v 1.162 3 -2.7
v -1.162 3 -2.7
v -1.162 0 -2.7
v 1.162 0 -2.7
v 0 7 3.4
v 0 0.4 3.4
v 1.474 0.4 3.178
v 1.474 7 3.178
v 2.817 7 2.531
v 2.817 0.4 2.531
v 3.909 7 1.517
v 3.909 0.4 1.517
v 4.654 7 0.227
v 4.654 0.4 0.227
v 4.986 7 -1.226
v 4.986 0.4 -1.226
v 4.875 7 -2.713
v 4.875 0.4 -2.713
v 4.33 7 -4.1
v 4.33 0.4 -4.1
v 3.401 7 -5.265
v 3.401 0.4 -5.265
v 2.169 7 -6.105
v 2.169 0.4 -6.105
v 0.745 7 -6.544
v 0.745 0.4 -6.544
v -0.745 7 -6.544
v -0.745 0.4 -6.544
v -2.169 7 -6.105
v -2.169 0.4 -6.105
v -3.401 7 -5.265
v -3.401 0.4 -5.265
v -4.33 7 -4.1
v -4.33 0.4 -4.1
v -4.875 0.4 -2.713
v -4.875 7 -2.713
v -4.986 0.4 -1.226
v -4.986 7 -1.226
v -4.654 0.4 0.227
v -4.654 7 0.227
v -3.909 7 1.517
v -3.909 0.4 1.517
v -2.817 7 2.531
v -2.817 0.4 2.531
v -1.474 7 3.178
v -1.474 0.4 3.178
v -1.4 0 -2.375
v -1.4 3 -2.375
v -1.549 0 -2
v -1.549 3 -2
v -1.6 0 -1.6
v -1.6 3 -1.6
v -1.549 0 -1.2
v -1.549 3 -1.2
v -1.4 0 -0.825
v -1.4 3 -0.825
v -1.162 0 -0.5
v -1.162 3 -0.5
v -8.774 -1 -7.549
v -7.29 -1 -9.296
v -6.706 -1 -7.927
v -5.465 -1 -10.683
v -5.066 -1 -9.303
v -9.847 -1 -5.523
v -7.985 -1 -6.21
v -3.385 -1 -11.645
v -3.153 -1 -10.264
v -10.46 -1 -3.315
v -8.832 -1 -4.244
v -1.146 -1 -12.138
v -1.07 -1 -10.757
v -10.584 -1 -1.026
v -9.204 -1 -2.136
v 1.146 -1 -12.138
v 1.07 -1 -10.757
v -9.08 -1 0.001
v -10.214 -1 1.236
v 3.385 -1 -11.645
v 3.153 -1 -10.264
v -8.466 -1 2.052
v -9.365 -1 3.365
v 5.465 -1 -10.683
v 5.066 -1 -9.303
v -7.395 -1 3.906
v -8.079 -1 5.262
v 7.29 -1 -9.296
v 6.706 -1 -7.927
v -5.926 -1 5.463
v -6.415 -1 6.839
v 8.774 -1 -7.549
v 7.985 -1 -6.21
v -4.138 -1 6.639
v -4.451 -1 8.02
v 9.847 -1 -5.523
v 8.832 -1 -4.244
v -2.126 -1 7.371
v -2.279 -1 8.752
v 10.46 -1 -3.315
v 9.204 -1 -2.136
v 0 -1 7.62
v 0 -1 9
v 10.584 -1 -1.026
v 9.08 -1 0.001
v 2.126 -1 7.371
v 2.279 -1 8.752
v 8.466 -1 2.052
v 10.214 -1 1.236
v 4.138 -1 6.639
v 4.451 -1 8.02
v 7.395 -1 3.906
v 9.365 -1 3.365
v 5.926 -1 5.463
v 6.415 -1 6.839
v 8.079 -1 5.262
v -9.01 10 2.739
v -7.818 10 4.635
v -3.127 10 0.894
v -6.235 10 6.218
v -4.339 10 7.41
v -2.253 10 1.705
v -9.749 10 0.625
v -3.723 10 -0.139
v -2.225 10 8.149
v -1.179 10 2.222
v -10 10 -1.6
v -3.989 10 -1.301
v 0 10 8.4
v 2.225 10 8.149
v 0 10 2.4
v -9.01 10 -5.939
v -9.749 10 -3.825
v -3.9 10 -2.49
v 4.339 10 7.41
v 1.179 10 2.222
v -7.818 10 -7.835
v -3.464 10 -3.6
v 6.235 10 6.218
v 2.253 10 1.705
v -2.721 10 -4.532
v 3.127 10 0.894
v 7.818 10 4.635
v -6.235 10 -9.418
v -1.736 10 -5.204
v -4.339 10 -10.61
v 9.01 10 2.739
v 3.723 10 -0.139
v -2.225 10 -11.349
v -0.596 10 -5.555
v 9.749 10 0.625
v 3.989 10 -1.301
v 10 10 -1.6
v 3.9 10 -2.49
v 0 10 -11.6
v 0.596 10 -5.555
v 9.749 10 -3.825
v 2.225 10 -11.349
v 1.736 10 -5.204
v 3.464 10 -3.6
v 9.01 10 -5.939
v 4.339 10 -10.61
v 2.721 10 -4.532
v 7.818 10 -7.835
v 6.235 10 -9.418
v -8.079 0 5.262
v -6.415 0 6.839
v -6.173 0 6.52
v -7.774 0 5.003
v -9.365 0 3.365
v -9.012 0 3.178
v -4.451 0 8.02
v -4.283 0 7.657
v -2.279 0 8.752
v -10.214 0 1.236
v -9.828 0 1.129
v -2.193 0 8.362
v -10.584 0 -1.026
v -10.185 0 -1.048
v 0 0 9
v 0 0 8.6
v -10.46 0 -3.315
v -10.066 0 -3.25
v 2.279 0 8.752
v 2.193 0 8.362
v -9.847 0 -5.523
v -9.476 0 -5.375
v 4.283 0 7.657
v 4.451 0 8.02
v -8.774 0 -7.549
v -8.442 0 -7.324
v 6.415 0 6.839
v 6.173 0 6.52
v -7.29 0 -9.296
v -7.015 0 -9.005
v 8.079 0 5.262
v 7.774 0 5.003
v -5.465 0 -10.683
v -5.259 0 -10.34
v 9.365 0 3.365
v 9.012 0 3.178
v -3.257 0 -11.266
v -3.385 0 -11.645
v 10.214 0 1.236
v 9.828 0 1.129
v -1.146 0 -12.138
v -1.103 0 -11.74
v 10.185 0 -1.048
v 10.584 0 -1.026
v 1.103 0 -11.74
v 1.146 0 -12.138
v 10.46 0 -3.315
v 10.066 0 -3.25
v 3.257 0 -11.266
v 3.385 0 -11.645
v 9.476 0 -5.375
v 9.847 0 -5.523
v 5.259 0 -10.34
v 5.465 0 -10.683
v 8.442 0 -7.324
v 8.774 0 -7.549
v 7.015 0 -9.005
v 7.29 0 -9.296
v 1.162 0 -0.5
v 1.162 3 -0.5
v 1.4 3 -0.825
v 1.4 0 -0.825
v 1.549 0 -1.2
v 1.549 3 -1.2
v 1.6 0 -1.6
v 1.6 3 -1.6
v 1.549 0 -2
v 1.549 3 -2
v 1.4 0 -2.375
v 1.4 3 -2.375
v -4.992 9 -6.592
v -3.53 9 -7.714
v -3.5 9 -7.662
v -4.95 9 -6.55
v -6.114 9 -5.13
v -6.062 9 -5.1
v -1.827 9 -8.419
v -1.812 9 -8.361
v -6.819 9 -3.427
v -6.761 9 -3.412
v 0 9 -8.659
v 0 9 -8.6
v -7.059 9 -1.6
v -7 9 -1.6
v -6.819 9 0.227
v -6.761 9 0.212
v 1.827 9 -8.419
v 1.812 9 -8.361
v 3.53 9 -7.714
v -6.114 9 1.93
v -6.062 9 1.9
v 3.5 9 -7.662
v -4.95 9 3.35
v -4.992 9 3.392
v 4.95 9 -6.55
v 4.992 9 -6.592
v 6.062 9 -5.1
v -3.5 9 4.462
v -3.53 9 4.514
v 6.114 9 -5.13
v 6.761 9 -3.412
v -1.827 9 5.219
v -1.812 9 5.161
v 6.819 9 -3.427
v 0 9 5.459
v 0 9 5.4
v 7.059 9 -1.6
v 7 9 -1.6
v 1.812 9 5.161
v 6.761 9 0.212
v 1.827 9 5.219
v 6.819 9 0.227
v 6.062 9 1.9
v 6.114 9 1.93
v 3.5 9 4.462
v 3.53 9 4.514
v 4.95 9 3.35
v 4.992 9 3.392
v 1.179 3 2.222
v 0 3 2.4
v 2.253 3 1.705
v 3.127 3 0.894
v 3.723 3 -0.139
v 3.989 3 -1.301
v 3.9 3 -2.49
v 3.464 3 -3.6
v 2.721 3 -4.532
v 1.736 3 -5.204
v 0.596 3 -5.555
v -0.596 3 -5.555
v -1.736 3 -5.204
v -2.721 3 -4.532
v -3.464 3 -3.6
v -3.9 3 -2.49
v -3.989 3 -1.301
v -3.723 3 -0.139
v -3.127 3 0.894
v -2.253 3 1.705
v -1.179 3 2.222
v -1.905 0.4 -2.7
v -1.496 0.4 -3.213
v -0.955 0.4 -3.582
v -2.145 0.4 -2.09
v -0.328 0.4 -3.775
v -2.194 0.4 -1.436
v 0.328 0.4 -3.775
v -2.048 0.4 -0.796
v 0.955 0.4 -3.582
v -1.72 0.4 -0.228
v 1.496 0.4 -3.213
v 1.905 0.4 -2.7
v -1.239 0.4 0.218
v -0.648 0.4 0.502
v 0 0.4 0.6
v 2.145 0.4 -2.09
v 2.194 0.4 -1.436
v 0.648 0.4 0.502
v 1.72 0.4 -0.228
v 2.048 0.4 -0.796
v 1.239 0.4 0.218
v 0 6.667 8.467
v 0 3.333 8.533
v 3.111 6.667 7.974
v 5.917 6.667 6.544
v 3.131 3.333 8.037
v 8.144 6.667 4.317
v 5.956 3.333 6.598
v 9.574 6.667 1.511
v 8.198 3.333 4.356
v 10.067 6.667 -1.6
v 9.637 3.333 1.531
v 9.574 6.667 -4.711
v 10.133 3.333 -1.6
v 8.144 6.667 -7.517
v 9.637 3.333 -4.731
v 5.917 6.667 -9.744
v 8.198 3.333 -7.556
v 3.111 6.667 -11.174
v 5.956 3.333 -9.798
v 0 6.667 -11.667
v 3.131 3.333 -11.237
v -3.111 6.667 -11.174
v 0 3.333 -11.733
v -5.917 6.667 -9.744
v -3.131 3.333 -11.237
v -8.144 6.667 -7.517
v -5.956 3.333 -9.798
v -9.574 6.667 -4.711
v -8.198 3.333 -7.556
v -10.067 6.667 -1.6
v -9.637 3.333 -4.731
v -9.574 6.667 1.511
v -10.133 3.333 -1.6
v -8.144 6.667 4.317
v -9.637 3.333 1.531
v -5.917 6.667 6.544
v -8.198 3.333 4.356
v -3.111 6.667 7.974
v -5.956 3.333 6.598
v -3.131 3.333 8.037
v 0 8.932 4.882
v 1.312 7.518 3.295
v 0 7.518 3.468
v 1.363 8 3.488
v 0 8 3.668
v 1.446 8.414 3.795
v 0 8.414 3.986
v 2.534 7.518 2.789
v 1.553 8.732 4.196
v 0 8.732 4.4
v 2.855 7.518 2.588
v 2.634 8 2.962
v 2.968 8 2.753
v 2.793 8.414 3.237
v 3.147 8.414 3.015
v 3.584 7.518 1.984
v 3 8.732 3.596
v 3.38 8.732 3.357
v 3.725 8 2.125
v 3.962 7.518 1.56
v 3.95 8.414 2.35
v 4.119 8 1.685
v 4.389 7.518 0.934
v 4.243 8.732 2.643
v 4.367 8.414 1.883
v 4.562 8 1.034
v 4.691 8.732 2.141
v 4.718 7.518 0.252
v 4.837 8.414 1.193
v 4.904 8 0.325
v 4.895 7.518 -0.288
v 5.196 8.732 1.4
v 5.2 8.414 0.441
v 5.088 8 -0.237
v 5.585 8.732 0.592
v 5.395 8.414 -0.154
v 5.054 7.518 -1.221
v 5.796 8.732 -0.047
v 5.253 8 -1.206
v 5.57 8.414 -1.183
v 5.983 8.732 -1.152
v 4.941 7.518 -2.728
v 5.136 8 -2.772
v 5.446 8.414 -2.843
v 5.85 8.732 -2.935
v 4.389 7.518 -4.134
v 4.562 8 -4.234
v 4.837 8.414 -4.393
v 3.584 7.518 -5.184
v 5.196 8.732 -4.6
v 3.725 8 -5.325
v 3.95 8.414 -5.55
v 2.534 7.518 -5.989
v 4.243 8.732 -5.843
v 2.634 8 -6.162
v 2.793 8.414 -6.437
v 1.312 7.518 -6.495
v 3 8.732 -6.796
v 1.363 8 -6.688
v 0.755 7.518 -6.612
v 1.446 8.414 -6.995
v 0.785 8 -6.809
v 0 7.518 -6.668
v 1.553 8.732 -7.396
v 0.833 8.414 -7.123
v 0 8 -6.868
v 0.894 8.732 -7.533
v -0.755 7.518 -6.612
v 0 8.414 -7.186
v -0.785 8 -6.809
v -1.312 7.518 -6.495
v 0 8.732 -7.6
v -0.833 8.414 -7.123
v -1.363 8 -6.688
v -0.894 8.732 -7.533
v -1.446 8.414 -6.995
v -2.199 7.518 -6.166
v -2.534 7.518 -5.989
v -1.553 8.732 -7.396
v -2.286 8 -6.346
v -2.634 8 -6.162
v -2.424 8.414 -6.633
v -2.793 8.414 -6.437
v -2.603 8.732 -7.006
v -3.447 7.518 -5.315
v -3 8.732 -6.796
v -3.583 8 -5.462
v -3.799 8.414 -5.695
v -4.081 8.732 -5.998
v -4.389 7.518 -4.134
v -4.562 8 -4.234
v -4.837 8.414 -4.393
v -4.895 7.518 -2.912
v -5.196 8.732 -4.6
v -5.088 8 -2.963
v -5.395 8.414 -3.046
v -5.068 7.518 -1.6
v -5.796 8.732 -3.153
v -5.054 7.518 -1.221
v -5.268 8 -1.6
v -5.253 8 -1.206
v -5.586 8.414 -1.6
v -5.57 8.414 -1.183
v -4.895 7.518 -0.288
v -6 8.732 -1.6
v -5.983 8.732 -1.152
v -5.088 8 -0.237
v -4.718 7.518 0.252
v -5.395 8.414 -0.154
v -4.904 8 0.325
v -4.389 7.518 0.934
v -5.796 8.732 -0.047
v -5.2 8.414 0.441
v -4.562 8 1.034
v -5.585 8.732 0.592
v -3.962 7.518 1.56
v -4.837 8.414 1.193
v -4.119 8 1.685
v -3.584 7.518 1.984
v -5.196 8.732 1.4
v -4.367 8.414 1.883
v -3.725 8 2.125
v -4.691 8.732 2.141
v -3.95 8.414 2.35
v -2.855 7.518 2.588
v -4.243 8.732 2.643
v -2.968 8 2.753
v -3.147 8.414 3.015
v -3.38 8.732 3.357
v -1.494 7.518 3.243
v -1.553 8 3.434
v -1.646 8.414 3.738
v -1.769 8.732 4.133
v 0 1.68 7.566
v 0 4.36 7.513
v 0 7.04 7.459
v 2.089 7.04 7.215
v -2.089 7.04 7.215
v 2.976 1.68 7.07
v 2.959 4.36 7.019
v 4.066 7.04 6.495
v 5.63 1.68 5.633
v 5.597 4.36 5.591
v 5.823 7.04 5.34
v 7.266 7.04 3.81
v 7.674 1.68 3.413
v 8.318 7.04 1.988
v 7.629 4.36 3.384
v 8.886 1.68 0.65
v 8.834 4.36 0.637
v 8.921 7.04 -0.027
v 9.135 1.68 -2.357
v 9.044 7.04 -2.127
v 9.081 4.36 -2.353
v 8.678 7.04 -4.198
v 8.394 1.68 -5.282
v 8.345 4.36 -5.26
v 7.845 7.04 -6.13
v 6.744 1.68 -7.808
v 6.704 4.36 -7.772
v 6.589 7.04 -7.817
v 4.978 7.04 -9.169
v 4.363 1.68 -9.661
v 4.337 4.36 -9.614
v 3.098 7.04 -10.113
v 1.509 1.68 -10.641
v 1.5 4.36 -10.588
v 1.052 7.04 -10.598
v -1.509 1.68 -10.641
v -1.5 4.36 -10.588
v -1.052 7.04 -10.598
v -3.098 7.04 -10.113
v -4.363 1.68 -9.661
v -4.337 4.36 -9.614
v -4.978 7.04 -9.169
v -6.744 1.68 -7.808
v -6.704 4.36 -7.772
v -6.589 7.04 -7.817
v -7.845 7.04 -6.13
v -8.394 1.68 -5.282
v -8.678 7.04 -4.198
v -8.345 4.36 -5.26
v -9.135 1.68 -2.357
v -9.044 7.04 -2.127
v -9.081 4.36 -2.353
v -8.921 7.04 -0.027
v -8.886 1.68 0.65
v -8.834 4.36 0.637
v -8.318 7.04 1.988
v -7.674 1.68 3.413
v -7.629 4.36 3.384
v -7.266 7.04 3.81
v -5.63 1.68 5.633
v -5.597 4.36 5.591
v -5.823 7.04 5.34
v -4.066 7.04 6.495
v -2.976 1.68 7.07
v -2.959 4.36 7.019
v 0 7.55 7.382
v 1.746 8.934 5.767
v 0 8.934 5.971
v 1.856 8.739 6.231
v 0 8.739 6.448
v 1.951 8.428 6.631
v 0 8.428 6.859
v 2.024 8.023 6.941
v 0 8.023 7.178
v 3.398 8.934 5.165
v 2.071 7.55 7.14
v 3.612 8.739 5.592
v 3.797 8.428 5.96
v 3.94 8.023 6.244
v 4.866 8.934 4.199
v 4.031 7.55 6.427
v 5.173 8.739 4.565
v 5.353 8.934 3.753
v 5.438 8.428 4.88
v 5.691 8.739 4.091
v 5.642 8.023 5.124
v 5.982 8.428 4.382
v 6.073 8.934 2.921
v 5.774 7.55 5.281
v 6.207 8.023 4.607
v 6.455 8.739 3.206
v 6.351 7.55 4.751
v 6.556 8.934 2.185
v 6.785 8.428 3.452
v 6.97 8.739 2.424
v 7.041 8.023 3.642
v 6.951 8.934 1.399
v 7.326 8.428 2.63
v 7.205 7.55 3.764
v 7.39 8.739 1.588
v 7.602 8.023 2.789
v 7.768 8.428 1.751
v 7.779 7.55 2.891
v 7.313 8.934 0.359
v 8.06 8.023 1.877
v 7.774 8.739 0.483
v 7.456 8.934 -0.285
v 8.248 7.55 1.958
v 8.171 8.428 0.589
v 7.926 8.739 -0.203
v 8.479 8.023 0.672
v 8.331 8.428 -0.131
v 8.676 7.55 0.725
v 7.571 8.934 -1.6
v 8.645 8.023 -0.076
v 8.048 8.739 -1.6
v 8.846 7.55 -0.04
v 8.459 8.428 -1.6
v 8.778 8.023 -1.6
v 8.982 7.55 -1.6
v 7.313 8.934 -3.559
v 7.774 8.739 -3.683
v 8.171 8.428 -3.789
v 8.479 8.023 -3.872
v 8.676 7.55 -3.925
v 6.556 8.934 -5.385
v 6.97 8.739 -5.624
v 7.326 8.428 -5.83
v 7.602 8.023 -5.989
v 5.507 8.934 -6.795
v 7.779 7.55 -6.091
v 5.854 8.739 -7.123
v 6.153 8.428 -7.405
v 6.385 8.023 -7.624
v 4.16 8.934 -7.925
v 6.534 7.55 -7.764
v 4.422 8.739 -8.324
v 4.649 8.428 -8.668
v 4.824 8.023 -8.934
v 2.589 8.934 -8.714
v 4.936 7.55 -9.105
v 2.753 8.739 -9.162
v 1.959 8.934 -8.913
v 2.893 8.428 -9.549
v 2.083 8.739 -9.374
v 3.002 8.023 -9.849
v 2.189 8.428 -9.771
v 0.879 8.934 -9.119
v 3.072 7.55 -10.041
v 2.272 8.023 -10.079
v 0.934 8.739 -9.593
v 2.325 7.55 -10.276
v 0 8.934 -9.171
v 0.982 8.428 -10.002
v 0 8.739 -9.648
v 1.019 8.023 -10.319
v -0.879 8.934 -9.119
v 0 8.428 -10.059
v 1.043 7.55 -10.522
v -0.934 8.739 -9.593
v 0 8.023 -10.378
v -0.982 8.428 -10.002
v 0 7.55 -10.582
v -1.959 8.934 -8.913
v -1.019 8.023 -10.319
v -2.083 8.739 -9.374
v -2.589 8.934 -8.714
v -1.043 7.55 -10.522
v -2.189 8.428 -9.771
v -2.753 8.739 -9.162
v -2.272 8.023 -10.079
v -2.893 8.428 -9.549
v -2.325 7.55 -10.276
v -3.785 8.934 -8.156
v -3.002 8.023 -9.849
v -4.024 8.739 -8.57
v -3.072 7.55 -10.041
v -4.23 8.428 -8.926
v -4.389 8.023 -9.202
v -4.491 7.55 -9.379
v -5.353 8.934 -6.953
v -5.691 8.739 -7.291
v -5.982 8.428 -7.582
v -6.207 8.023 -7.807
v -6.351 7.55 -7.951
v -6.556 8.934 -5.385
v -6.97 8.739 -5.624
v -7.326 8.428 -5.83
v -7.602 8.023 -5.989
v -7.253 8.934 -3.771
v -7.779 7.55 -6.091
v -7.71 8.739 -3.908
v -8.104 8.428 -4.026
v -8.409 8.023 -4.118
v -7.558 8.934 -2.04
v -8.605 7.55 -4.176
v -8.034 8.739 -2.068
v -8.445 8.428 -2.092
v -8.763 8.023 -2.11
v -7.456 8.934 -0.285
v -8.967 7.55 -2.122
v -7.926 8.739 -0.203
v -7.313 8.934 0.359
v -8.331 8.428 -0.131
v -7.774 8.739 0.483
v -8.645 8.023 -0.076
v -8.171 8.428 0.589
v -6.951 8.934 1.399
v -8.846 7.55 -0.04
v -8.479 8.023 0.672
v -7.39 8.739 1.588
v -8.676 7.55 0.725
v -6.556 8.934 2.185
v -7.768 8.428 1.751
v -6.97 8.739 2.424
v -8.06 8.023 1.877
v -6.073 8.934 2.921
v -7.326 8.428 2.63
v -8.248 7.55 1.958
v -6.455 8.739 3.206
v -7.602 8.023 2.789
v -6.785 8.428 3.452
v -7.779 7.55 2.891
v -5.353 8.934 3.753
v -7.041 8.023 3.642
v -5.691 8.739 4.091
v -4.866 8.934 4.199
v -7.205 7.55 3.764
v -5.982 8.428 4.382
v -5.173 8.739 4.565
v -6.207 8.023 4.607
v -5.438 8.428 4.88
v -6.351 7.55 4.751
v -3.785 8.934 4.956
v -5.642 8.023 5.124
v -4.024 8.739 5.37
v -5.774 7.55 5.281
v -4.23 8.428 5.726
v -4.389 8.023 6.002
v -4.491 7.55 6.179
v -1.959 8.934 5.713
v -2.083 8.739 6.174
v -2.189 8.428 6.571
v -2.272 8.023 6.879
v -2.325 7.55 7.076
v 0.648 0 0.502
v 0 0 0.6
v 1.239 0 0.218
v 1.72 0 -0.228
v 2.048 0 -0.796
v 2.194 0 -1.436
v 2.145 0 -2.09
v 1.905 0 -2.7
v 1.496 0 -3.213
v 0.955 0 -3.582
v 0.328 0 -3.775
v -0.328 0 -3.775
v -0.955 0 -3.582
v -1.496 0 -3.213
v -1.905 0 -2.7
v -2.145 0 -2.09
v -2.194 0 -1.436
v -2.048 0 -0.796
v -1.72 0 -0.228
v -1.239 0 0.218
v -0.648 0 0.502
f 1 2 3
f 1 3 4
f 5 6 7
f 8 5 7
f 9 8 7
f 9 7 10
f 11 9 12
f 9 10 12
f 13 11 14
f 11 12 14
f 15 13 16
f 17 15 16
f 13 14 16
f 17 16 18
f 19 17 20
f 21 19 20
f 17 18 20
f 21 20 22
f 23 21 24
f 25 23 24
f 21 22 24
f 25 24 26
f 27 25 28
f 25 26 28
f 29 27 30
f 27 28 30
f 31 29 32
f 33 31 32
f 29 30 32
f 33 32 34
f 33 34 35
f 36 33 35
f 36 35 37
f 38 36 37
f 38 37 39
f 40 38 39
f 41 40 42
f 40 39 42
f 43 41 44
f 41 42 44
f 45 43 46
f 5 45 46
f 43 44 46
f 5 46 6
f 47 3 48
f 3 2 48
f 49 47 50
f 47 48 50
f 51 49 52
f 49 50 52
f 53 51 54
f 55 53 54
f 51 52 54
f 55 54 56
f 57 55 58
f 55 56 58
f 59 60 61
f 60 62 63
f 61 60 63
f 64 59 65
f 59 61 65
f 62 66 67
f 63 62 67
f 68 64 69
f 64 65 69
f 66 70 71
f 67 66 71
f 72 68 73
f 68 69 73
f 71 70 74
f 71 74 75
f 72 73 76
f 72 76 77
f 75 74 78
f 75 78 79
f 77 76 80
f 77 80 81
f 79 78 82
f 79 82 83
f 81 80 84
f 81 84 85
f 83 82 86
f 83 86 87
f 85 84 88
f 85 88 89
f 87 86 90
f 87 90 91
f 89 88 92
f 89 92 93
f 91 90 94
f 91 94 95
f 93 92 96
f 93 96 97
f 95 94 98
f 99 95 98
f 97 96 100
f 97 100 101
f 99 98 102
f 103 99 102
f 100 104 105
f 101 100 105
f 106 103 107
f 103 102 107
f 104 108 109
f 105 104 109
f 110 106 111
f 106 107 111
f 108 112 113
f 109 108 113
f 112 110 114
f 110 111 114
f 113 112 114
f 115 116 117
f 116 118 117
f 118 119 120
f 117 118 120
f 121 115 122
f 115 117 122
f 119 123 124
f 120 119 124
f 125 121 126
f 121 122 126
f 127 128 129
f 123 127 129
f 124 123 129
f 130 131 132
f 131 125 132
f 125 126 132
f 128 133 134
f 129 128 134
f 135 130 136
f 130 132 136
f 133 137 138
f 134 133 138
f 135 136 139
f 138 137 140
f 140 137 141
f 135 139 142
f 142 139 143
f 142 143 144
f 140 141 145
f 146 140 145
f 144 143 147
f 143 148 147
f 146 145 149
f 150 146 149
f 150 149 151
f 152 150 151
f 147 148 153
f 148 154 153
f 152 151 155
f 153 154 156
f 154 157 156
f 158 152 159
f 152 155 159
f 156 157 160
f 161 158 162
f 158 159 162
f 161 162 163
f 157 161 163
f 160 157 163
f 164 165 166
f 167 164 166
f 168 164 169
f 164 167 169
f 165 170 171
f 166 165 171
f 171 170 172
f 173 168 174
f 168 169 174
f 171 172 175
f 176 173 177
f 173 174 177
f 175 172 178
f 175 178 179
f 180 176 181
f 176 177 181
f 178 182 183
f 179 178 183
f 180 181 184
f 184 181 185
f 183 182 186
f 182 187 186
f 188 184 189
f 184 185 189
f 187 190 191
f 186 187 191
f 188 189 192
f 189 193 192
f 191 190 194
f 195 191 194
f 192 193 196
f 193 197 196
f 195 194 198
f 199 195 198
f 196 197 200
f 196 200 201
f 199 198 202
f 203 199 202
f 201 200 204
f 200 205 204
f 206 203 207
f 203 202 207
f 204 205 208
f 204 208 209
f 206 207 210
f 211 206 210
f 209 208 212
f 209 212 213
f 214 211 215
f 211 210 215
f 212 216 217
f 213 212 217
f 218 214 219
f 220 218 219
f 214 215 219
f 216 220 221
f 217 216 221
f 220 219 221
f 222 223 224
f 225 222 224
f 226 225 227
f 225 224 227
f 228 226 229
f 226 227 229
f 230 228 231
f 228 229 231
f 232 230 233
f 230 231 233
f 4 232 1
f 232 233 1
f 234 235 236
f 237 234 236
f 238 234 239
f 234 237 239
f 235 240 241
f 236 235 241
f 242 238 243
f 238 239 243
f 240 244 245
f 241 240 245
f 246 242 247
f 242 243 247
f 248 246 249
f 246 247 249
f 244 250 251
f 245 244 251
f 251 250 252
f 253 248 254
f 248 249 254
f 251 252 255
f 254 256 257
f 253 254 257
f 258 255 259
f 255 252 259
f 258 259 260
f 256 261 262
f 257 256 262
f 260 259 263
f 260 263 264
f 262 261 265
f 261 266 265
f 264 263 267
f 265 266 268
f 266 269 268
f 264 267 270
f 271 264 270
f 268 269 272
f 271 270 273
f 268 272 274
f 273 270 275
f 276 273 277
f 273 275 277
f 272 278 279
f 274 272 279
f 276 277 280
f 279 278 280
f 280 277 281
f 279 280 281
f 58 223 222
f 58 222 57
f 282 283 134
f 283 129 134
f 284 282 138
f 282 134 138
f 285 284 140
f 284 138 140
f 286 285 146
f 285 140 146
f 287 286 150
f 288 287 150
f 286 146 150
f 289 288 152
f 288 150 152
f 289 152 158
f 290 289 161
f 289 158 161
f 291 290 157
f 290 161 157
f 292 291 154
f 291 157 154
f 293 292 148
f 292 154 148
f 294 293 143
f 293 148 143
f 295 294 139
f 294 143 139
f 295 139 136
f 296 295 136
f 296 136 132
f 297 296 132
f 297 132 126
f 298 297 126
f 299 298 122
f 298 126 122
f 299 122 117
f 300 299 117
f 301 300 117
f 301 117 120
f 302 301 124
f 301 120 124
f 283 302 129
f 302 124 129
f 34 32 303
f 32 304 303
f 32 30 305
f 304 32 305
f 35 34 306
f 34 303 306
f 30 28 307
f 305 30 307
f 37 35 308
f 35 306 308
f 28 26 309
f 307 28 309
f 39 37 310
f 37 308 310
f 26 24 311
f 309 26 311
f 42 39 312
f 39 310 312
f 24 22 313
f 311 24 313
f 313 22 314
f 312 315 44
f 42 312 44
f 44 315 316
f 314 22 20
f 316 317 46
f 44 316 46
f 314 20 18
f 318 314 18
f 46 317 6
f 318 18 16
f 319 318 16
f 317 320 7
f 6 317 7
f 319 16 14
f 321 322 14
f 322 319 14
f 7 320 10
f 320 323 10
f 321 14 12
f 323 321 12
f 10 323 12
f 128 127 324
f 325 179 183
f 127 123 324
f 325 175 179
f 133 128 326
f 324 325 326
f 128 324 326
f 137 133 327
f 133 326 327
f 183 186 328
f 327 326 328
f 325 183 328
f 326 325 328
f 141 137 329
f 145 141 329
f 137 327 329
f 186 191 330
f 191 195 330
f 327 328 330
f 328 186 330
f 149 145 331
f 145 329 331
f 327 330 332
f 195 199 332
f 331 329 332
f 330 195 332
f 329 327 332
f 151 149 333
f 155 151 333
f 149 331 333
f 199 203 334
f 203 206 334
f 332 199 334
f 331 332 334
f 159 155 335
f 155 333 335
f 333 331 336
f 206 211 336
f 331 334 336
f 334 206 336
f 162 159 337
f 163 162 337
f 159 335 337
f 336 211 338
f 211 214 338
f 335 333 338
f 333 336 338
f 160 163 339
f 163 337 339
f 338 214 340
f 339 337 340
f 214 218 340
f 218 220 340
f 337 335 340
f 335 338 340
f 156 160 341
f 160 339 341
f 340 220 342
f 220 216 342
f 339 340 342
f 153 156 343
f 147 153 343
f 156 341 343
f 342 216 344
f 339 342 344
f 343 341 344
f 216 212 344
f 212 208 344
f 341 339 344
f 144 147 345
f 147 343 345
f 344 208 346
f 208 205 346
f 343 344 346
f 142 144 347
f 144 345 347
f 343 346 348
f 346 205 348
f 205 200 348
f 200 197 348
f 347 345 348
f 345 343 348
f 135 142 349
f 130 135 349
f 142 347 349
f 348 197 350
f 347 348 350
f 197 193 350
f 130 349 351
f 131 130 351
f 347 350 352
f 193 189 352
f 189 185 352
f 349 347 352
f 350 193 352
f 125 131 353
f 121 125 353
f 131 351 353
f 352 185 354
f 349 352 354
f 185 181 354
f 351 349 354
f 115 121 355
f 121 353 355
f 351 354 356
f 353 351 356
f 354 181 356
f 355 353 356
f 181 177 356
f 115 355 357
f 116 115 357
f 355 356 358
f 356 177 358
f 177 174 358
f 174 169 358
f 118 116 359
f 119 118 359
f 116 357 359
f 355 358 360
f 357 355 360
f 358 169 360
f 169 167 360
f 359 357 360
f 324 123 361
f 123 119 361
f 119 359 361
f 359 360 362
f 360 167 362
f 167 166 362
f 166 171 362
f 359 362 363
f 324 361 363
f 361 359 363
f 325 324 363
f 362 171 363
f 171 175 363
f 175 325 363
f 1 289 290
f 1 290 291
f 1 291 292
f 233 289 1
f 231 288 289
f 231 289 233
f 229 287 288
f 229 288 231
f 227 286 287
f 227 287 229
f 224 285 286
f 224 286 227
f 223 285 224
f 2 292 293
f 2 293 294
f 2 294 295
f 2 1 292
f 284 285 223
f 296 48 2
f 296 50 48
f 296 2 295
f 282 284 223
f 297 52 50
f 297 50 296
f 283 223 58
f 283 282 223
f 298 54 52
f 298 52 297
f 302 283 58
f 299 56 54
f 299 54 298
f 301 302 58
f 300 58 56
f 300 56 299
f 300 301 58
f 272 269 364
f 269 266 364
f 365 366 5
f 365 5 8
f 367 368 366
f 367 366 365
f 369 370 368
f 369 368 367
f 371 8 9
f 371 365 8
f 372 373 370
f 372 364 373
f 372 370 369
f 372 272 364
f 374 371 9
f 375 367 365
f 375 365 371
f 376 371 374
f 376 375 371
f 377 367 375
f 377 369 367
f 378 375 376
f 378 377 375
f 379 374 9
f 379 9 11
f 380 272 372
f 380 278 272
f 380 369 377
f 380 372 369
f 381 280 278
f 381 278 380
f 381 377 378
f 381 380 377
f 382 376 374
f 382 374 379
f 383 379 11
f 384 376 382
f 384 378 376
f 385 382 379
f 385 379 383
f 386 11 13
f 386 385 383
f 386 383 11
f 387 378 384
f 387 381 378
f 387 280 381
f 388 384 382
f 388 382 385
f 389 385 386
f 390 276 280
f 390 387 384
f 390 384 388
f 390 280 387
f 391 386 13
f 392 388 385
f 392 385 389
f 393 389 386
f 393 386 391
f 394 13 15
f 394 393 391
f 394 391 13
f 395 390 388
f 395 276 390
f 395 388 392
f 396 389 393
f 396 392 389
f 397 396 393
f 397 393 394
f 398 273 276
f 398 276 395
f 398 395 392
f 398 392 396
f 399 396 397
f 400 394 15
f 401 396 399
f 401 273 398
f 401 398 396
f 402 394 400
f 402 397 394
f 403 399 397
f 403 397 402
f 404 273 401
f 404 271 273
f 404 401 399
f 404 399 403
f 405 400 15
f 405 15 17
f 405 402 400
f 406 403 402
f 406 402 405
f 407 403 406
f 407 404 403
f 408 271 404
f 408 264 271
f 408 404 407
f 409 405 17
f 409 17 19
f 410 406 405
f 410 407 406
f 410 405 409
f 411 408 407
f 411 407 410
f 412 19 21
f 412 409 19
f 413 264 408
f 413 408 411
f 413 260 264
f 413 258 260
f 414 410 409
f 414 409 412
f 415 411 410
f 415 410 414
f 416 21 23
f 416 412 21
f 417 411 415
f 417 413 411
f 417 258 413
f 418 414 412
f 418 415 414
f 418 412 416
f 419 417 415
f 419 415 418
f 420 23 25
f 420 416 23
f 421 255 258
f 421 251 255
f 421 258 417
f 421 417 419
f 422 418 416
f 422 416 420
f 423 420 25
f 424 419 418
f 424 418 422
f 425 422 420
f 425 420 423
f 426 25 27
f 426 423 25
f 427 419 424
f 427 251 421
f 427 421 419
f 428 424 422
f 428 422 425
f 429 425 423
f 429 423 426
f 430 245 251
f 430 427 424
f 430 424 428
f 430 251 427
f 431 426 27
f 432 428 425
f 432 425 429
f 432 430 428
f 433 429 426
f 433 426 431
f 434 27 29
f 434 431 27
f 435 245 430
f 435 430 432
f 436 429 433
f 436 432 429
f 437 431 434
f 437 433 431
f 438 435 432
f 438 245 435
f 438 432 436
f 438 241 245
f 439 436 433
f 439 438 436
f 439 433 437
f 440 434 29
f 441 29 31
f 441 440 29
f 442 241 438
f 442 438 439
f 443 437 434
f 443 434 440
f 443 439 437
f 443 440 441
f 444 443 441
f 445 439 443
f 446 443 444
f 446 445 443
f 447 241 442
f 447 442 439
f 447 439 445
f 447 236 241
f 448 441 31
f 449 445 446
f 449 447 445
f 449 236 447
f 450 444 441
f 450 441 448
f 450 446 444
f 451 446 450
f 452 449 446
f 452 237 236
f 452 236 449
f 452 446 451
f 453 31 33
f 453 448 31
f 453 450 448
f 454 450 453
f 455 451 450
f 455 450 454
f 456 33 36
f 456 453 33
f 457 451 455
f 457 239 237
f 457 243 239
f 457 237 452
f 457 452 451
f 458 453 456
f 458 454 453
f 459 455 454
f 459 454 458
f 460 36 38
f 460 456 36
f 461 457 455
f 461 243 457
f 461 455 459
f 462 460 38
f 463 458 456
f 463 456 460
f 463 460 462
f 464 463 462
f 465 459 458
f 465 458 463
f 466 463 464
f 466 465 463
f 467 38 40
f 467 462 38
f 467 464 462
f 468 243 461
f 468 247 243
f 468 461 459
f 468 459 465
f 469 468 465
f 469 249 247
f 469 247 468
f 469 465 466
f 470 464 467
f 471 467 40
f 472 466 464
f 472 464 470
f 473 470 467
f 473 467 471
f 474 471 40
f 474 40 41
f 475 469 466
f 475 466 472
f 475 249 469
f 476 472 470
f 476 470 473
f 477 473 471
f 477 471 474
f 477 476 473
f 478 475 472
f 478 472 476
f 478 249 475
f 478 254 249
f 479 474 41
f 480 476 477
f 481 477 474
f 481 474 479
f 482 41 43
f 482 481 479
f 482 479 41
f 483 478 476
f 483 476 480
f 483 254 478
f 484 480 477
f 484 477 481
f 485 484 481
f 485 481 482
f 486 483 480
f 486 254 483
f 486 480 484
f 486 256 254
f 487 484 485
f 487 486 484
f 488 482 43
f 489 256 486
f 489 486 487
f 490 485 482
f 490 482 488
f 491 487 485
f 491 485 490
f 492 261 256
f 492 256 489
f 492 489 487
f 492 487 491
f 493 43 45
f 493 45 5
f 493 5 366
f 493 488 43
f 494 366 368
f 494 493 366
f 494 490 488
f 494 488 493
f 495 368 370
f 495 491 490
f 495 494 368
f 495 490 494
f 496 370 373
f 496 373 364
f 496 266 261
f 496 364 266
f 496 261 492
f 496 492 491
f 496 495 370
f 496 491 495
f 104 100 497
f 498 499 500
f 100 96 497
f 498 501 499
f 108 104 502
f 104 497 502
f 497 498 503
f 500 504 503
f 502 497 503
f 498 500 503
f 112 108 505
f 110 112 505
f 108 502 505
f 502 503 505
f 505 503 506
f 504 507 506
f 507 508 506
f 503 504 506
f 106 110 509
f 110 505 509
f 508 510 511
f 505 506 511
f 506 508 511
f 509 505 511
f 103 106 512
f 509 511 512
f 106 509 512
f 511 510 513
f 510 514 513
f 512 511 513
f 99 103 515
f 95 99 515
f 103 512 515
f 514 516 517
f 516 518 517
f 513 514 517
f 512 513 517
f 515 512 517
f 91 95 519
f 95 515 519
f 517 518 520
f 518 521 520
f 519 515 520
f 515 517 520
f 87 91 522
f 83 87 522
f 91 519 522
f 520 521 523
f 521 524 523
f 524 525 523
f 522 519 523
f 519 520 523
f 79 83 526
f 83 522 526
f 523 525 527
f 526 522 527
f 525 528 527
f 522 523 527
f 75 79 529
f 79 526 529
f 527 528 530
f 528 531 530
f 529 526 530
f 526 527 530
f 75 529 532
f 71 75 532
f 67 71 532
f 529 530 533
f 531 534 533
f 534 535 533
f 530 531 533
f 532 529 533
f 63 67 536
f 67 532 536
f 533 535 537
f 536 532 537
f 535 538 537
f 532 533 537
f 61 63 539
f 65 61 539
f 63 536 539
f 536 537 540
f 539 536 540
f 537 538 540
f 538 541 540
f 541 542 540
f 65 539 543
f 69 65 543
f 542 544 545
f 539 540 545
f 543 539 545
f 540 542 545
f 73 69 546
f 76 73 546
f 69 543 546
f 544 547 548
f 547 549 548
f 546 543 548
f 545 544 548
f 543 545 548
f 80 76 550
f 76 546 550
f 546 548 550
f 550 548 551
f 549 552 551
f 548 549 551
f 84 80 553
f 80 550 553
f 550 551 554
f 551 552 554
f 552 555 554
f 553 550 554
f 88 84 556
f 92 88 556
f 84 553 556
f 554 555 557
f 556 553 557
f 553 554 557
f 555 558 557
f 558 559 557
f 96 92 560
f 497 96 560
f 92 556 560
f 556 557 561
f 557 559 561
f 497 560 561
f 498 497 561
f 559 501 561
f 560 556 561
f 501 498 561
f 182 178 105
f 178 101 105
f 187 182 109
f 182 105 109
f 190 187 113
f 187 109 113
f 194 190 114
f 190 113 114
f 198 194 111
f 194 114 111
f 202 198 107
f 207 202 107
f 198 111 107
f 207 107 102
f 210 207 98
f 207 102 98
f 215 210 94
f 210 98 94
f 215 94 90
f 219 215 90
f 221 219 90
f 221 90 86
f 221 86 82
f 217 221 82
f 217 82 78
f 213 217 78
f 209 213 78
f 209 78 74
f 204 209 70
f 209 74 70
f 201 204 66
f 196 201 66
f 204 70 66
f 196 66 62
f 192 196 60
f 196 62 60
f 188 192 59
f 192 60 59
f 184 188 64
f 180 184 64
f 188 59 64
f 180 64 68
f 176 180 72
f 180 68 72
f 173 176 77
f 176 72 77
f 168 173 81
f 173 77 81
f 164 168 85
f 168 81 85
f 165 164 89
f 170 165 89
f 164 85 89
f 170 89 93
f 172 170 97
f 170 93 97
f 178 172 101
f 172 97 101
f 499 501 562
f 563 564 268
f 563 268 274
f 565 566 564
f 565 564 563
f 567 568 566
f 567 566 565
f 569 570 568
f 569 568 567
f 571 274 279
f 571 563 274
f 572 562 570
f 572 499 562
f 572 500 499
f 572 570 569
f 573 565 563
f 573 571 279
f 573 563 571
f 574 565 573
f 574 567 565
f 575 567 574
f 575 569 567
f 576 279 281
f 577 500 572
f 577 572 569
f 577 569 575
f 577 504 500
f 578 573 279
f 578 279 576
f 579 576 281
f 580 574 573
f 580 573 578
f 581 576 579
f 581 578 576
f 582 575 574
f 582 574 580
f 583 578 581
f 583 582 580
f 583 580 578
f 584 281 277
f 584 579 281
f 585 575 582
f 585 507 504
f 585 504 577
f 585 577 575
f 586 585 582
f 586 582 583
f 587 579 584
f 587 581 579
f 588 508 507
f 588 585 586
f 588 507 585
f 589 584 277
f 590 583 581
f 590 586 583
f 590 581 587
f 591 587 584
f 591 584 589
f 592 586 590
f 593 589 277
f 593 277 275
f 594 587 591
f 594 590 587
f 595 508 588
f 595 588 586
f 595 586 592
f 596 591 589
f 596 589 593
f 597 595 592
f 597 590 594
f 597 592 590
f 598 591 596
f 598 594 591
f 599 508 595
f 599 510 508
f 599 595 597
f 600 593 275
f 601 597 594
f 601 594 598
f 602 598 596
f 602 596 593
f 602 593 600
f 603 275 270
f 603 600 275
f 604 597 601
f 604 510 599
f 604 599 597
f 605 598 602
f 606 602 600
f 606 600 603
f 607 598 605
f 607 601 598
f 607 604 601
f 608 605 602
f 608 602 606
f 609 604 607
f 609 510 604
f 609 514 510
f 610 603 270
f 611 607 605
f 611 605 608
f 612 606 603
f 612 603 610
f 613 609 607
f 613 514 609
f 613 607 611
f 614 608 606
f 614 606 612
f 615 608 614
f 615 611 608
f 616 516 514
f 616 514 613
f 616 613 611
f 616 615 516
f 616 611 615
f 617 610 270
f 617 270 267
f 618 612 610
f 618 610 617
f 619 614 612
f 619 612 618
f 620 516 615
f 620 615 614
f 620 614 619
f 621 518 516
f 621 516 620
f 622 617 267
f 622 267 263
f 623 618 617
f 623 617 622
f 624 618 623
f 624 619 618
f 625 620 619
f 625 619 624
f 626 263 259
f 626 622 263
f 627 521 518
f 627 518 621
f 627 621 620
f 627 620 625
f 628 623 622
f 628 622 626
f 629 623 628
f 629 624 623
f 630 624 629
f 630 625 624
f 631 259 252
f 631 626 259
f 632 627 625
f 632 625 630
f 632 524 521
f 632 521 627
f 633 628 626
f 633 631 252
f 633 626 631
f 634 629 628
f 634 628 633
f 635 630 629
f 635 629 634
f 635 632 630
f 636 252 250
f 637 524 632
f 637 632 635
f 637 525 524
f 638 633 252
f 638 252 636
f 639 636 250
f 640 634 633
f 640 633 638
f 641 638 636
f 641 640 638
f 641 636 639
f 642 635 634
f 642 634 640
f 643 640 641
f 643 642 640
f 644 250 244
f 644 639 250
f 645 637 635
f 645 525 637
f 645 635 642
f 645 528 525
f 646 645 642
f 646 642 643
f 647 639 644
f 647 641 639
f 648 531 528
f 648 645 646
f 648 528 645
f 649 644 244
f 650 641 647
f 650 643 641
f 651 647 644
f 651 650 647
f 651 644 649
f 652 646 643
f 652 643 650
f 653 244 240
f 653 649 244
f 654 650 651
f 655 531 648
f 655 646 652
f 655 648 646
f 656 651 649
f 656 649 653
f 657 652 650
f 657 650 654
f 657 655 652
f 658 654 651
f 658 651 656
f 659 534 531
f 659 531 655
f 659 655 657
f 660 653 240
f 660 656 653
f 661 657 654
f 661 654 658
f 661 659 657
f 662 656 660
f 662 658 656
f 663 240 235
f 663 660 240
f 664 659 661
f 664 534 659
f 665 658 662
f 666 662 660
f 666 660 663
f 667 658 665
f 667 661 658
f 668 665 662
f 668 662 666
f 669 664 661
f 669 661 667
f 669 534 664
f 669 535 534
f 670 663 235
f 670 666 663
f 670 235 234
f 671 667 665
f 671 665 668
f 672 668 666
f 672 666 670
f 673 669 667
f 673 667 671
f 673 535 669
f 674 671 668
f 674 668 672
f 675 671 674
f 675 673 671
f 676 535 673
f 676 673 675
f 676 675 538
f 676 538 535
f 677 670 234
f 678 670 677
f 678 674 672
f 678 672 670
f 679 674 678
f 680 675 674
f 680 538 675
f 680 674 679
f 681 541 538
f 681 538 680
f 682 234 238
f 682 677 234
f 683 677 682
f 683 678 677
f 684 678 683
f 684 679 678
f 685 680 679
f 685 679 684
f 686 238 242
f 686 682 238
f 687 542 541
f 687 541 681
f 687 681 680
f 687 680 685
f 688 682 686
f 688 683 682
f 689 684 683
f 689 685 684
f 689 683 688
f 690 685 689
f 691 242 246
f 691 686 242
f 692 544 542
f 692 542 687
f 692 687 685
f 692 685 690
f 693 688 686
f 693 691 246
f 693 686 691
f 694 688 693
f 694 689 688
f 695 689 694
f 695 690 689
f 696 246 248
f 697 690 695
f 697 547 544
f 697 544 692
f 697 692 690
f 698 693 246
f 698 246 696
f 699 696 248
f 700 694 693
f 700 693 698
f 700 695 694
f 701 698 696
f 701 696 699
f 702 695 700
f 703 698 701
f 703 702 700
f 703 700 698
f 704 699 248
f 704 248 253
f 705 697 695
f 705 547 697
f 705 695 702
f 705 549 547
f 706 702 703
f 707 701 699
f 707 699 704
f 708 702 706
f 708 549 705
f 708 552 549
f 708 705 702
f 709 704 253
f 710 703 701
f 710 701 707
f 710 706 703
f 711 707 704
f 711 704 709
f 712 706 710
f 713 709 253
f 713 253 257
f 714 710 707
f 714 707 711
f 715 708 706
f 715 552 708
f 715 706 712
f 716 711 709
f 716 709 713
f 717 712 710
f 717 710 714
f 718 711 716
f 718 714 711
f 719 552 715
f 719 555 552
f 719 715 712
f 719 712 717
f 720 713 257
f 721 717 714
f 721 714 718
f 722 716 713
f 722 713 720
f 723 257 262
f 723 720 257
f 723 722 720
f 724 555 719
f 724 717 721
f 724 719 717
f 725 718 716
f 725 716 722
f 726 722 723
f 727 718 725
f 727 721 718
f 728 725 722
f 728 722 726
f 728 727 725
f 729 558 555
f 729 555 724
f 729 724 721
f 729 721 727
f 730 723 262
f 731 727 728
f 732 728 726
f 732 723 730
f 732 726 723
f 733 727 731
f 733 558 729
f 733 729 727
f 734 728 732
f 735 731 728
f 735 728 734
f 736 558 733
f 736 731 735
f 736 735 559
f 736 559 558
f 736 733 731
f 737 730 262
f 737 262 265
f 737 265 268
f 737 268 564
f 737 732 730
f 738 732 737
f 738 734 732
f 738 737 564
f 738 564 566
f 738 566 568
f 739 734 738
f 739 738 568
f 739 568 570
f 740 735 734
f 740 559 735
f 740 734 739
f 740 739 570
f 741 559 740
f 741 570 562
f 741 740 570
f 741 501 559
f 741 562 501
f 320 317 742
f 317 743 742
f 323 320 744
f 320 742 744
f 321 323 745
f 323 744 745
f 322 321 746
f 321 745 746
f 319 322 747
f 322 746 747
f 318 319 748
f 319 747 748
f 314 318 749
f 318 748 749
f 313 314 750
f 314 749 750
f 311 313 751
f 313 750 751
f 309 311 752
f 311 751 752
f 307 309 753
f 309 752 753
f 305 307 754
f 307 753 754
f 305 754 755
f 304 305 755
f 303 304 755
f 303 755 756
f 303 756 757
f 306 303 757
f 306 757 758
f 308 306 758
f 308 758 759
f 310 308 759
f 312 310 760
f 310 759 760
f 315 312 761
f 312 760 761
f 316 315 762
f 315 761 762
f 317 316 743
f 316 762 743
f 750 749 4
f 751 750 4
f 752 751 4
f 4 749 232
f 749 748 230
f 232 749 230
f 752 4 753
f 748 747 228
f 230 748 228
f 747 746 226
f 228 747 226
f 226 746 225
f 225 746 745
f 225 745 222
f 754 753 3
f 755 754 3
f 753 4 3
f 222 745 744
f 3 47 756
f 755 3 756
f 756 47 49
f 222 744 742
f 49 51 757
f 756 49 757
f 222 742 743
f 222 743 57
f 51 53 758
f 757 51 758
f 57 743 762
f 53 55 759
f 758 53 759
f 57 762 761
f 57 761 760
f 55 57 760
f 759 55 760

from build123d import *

# Parameters (mm, degrees)
F3_DEPTH = 3
F4_R     = 2


with BuildPart() as f1:
    # F0 (on Right) → F1 (revolve)
    with BuildSketch(Plane.YZ):
        Polygon((0, 0.6), (0, 0), (3, 0), (3, 2.4), (10, 2.4), (10, 8.4), (0, 8.6), (0, 9), (-1, 9), (-1, 7.61980002), (9, 7.41980002), (9, 3.4), (0.4, 3.4), (0.4, 0.6), align=None)
    revolve(axis=Axis((0, 5.8202521418, -1.6), (0, 1, 0)))

    # F2 (on face) → F3 (join, through all)
    with BuildSketch(Plane(origin=(0, 3, 0), x_dir=(-1, 0, 0), z_dir=(0, 1, 0))):
        with BuildLine():
            Line((-1.1618950039, -0.5), (1.1618950039, -0.5))
            ThreePointArc((1.1618950039, -0.5), (0, 0), (-1.1618950039, -0.5))
        make_face()
        with BuildLine():
            ThreePointArc((-1.1618950039, -2.7), (0, -3.2), (1.1618950039, -2.7))
            Line((1.1618950039, -2.7), (-1.1618950039, -2.7))
        make_face()
    extrude(amount=-F3_DEPTH)

    # F4
    f4_edges = [f1.edges().sort_by_distance(p)[0] for p in [
        (0, 9, -10.6198),
        (0, 9, -6.6),
    ]]
    fillet(f4_edges, radius=F4_R)


solid = f1.part
